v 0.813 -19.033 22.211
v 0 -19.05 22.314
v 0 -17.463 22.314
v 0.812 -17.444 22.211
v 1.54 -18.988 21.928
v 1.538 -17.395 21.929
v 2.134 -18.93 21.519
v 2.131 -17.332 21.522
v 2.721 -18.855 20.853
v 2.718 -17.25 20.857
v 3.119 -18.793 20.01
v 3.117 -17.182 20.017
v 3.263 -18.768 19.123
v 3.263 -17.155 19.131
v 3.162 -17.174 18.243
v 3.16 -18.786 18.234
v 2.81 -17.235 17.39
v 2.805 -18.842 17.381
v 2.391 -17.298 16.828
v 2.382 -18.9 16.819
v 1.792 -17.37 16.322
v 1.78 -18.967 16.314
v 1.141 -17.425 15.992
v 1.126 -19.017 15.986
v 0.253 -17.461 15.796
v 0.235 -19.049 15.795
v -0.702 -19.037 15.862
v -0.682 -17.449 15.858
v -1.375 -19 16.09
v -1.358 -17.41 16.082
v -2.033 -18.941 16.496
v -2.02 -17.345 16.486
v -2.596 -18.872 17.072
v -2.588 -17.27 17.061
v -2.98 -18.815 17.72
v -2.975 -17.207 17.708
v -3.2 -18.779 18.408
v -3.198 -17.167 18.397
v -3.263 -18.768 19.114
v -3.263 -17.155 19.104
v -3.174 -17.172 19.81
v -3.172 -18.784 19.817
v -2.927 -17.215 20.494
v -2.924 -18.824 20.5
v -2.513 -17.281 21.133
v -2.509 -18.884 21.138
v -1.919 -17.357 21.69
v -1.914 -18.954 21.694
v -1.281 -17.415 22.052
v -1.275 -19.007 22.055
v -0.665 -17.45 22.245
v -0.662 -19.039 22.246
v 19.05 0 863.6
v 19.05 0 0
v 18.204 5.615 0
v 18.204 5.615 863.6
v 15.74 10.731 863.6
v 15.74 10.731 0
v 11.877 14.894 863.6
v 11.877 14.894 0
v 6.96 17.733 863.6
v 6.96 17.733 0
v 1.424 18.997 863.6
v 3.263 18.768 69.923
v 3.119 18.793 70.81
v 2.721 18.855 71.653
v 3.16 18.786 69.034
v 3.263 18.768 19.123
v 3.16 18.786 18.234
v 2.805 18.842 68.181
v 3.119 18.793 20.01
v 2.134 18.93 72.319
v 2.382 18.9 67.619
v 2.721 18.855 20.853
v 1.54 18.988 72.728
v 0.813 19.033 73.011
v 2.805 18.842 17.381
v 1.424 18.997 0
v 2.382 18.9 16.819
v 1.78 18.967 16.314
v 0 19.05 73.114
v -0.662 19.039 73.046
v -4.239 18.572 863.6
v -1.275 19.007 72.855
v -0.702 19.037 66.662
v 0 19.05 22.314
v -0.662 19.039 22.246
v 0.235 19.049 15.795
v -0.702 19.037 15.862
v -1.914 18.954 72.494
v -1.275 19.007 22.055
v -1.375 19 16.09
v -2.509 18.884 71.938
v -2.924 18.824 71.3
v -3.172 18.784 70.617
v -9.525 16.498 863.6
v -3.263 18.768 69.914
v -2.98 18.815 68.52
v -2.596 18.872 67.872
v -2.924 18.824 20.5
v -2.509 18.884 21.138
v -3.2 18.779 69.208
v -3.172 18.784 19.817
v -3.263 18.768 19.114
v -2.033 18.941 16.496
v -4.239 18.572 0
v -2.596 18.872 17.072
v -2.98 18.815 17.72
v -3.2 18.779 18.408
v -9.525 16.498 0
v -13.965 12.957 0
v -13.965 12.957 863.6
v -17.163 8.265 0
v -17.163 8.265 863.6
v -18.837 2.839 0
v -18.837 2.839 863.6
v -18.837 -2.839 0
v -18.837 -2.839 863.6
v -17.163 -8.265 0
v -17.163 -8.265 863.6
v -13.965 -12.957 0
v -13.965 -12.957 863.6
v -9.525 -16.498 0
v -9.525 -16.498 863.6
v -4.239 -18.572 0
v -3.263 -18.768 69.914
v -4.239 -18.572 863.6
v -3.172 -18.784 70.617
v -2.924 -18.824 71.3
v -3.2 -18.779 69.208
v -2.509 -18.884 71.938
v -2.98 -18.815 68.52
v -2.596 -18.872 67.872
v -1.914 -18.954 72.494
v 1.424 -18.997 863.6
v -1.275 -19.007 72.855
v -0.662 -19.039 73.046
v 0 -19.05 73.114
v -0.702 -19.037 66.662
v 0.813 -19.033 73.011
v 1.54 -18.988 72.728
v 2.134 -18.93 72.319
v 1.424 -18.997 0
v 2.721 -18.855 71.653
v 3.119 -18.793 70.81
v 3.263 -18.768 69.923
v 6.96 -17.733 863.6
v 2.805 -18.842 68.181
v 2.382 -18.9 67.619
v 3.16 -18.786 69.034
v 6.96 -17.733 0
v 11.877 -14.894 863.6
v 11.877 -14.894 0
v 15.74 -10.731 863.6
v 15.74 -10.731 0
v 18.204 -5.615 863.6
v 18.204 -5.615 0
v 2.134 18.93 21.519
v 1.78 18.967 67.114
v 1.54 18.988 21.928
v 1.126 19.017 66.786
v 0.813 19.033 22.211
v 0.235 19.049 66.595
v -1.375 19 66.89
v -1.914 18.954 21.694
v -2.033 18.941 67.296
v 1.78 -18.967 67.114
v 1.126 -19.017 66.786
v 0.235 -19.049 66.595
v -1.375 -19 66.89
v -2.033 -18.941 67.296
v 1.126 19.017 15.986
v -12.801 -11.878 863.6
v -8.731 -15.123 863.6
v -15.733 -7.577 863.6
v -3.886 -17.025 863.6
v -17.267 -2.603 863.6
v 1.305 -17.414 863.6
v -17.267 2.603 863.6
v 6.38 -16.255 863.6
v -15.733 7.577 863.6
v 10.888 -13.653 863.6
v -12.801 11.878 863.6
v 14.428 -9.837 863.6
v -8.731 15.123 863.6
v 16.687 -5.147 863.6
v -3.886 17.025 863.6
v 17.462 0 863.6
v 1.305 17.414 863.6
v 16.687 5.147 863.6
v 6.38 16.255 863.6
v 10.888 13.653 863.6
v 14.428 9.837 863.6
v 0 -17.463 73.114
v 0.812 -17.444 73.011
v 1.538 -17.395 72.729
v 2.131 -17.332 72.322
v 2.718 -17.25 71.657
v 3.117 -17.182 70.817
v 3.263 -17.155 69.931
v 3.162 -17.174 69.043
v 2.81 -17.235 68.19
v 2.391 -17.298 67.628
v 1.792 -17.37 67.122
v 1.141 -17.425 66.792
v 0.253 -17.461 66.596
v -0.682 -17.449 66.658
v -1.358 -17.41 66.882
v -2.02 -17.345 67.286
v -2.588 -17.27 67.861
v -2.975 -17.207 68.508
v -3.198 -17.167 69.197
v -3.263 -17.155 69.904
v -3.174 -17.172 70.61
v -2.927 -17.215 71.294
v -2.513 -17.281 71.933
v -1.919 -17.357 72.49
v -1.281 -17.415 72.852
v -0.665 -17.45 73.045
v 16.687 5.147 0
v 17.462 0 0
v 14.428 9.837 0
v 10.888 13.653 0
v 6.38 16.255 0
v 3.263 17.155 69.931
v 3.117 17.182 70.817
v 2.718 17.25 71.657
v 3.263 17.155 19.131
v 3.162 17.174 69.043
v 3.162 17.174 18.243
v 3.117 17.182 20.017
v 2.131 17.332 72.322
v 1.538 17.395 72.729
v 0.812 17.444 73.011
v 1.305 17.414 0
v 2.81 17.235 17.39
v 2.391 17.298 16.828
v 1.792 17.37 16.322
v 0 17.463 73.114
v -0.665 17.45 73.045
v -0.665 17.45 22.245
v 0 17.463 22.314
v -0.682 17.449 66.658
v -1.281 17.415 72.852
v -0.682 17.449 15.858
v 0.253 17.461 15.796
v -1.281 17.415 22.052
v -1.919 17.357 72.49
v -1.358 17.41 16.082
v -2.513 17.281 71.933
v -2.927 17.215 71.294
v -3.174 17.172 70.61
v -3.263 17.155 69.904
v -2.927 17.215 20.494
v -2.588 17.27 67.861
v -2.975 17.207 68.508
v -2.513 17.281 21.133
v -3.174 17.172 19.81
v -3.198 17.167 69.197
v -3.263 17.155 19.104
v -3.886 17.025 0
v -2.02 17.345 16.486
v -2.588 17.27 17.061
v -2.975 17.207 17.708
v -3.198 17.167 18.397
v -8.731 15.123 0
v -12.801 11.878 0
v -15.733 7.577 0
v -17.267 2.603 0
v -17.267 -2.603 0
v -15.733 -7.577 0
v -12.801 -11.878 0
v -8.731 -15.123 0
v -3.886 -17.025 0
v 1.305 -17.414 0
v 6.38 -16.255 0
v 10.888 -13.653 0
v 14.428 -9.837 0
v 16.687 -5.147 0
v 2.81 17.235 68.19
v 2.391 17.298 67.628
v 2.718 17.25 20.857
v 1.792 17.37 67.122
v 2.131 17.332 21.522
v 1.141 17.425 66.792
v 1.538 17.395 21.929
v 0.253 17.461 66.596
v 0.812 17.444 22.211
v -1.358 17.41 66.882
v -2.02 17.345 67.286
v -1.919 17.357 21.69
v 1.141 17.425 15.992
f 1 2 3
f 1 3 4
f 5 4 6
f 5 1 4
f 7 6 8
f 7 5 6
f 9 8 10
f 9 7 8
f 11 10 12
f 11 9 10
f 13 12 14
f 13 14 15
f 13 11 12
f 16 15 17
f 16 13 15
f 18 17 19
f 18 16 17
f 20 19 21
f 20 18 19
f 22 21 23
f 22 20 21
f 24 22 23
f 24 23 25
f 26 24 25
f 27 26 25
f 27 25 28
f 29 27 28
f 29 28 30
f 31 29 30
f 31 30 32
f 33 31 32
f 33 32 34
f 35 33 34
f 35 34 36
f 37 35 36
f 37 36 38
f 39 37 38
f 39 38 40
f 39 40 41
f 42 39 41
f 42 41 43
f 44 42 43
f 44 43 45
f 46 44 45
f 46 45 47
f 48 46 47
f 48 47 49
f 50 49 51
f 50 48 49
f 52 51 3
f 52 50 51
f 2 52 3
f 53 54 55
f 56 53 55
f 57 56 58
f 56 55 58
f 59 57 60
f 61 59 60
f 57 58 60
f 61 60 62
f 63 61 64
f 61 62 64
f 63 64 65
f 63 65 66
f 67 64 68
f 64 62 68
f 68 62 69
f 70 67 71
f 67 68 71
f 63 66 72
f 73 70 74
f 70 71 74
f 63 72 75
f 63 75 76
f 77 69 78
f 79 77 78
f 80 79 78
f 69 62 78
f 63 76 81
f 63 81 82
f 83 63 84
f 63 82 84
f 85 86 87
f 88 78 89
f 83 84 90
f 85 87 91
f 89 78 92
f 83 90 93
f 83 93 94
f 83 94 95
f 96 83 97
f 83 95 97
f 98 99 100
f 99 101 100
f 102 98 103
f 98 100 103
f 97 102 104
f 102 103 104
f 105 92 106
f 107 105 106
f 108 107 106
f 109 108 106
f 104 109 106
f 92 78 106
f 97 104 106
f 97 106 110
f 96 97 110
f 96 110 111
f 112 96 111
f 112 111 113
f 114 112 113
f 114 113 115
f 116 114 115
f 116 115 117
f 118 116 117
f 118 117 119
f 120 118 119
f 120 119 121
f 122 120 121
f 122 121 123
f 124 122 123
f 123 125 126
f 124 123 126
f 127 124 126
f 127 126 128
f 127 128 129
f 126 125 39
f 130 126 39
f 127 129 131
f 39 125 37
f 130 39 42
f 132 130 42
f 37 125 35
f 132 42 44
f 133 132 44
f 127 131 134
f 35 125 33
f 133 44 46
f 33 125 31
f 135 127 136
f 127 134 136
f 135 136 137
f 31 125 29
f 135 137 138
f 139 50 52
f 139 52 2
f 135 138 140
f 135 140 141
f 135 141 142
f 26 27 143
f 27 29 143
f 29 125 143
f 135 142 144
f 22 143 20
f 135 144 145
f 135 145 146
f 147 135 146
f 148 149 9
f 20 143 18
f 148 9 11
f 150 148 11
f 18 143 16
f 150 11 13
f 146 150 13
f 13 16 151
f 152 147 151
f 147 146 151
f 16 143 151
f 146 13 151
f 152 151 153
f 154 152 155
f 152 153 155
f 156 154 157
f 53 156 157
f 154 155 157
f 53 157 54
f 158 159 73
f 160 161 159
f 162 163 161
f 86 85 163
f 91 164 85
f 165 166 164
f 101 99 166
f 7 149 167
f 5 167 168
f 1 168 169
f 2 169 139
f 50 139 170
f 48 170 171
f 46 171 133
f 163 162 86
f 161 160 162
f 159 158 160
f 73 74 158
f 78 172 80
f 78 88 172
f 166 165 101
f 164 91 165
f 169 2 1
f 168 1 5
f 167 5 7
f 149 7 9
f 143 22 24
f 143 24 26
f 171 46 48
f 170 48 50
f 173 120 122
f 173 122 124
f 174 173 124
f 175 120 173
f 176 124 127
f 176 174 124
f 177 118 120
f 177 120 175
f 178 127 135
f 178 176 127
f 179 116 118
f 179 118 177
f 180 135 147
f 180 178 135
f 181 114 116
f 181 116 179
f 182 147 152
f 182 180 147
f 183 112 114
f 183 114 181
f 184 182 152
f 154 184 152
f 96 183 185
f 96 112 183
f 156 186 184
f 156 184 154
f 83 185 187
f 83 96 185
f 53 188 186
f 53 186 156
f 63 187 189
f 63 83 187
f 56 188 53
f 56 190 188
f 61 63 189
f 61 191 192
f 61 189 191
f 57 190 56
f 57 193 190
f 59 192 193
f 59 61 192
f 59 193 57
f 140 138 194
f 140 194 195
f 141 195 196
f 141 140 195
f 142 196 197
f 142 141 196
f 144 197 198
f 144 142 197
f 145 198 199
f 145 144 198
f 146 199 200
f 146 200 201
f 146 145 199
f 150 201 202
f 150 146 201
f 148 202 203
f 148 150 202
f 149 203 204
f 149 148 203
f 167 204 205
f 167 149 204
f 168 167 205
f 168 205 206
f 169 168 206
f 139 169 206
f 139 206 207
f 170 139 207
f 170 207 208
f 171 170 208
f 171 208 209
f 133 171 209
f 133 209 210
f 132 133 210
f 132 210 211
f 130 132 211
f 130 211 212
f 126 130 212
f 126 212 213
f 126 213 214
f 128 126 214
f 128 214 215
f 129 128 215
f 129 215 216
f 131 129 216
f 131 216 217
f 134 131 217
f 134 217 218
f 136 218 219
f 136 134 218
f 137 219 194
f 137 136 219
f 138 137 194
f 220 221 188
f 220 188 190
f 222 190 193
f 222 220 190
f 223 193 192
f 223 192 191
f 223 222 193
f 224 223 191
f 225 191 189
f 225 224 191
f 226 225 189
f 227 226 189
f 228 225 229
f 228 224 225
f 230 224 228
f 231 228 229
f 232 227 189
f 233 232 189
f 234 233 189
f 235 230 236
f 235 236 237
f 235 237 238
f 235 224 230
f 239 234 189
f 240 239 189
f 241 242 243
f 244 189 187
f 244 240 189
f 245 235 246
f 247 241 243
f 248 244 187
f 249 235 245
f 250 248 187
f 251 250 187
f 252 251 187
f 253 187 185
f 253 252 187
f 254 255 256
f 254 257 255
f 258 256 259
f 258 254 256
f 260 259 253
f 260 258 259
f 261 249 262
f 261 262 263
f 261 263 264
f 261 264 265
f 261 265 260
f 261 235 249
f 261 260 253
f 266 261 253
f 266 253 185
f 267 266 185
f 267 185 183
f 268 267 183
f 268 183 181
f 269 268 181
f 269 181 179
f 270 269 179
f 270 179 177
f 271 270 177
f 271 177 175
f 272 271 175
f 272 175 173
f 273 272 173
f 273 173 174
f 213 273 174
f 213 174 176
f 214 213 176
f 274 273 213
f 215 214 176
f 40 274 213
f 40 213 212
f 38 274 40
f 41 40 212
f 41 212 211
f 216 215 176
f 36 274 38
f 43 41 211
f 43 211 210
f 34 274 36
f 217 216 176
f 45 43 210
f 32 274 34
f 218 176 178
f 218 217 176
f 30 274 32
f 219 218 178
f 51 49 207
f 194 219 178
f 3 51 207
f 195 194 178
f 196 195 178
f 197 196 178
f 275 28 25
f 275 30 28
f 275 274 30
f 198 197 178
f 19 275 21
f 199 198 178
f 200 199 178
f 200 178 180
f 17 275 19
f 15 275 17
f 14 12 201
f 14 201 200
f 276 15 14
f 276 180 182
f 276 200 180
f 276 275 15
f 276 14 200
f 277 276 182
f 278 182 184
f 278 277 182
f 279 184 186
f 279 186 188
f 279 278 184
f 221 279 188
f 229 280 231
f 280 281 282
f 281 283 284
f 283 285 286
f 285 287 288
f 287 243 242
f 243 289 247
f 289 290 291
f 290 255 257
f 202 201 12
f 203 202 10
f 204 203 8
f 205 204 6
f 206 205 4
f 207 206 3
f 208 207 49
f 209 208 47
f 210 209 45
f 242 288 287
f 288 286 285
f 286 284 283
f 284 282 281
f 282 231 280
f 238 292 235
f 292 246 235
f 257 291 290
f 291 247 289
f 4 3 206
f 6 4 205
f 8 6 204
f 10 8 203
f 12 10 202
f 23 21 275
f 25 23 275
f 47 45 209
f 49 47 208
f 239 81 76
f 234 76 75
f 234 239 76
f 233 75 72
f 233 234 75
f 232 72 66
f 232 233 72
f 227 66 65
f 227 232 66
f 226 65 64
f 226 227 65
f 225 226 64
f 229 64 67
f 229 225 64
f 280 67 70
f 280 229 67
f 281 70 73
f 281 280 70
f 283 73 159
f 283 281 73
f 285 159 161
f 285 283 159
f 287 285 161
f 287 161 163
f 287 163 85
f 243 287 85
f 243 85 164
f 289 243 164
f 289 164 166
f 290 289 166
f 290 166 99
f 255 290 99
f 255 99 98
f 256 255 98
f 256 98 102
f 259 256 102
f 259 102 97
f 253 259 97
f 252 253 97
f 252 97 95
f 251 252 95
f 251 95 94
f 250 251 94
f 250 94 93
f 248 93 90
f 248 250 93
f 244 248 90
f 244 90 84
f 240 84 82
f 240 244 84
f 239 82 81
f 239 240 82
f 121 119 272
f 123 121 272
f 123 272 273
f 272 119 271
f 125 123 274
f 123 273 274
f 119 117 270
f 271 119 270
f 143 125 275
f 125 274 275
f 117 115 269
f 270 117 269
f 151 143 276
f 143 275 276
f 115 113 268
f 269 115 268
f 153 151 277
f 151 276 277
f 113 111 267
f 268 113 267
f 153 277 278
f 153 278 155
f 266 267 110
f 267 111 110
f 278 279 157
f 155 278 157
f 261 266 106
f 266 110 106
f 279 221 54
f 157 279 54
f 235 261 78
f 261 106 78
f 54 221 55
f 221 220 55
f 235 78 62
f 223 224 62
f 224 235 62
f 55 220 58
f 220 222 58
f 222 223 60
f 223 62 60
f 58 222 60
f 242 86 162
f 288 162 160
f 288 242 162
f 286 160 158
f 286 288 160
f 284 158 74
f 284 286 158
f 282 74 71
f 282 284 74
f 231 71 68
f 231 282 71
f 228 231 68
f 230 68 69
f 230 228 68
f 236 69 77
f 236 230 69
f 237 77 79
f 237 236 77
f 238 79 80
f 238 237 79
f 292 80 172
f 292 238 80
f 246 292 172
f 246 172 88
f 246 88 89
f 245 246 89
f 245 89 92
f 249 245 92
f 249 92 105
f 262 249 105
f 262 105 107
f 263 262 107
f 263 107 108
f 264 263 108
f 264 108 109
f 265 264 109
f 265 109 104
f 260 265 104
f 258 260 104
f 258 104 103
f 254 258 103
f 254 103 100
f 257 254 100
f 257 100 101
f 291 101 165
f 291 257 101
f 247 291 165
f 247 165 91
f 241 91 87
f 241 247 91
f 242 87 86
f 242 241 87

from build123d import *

# Parameters (mm, degrees)
CROQUIS1_R                 = 19.05
CROQUIS1_R_2               = 17.4625
SALIENTE_EXTRUIR1_DEPTH    = 863.6
CORTAR_EXTRUIR1_DEPTH      = 865.0201184
CORTAR_EXTRUIR1_DEPTH_BACK = 865.0201184
CROQUIS2_R                 = 3.2639


with BuildPart() as part:
    # Croquis1 → Saliente-Extruir1 (new body)
    with BuildSketch(Plane.XY):
        Circle(CROQUIS1_R)
        Circle(CROQUIS1_R_2, mode=Mode.SUBTRACT)
    extrude(amount=SALIENTE_EXTRUIR1_DEPTH)

    # Croquis2 → Cortar-Extruir1 (cut, two sides: drawn at the far end of the back side and taken through both)
    with BuildSketch(Plane(origin=(0, 0, 0), x_dir=(1, 0, 0), z_dir=(0, 1, 0)).offset(-CORTAR_EXTRUIR1_DEPTH_BACK)):
        with Locations(Location((0, -19.05, 0), (0, 0, 270))):
            Circle(CROQUIS2_R)
        with Locations(Location((0, -69.85, 0), (0, 0, 270))):
            Circle(CROQUIS2_R)
    extrude(amount=CORTAR_EXTRUIR1_DEPTH + CORTAR_EXTRUIR1_DEPTH_BACK, mode=Mode.SUBTRACT)


solid = part.part
